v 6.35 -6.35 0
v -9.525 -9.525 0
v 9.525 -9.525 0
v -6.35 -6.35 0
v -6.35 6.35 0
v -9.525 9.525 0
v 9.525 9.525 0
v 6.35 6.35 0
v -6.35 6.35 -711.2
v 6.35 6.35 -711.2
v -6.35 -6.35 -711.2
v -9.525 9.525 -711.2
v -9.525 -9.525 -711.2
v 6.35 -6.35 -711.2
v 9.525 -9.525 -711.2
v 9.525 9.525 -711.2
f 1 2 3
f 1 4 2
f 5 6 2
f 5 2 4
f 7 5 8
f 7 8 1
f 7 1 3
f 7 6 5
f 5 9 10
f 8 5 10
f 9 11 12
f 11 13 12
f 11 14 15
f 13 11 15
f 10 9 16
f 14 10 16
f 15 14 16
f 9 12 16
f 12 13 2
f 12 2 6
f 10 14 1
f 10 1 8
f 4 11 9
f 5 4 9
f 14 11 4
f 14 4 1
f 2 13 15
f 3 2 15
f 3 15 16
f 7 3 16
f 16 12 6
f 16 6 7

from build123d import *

# Parameters (mm, degrees)
SKETCH1_W           = 19.05
SKETCH1_H           = 19.05
BOSS_EXTRUDE1_DEPTH = 711.2
CUT_EXTRUDE1_REACH  = 713.2
SKETCH2_W           = 12.7
SKETCH2_H           = 12.7


with BuildPart() as part:
    # Sketch1 → Boss-Extrude1 (new body)
    with BuildSketch(Plane.XY):
        Rectangle(SKETCH1_W, SKETCH1_H)
    extrude(amount=-BOSS_EXTRUDE1_DEPTH)

    # Sketch2 → Cut-Extrude1 (cut, up to next)
    with BuildSketch(Plane.XY, mode=Mode.PRIVATE) as cut_extrude1_sk1:
        Rectangle(SKETCH2_W, SKETCH2_H)
    cut_extrude1_tool1 = extrude(cut_extrude1_sk1.sketch, amount=-CUT_EXTRUDE1_REACH, mode=Mode.PRIVATE) & part.part
    add(cut_extrude1_tool1.solids().sort_by_distance((0, 0, 0))[0], mode=Mode.SUBTRACT)


solid = part.part
